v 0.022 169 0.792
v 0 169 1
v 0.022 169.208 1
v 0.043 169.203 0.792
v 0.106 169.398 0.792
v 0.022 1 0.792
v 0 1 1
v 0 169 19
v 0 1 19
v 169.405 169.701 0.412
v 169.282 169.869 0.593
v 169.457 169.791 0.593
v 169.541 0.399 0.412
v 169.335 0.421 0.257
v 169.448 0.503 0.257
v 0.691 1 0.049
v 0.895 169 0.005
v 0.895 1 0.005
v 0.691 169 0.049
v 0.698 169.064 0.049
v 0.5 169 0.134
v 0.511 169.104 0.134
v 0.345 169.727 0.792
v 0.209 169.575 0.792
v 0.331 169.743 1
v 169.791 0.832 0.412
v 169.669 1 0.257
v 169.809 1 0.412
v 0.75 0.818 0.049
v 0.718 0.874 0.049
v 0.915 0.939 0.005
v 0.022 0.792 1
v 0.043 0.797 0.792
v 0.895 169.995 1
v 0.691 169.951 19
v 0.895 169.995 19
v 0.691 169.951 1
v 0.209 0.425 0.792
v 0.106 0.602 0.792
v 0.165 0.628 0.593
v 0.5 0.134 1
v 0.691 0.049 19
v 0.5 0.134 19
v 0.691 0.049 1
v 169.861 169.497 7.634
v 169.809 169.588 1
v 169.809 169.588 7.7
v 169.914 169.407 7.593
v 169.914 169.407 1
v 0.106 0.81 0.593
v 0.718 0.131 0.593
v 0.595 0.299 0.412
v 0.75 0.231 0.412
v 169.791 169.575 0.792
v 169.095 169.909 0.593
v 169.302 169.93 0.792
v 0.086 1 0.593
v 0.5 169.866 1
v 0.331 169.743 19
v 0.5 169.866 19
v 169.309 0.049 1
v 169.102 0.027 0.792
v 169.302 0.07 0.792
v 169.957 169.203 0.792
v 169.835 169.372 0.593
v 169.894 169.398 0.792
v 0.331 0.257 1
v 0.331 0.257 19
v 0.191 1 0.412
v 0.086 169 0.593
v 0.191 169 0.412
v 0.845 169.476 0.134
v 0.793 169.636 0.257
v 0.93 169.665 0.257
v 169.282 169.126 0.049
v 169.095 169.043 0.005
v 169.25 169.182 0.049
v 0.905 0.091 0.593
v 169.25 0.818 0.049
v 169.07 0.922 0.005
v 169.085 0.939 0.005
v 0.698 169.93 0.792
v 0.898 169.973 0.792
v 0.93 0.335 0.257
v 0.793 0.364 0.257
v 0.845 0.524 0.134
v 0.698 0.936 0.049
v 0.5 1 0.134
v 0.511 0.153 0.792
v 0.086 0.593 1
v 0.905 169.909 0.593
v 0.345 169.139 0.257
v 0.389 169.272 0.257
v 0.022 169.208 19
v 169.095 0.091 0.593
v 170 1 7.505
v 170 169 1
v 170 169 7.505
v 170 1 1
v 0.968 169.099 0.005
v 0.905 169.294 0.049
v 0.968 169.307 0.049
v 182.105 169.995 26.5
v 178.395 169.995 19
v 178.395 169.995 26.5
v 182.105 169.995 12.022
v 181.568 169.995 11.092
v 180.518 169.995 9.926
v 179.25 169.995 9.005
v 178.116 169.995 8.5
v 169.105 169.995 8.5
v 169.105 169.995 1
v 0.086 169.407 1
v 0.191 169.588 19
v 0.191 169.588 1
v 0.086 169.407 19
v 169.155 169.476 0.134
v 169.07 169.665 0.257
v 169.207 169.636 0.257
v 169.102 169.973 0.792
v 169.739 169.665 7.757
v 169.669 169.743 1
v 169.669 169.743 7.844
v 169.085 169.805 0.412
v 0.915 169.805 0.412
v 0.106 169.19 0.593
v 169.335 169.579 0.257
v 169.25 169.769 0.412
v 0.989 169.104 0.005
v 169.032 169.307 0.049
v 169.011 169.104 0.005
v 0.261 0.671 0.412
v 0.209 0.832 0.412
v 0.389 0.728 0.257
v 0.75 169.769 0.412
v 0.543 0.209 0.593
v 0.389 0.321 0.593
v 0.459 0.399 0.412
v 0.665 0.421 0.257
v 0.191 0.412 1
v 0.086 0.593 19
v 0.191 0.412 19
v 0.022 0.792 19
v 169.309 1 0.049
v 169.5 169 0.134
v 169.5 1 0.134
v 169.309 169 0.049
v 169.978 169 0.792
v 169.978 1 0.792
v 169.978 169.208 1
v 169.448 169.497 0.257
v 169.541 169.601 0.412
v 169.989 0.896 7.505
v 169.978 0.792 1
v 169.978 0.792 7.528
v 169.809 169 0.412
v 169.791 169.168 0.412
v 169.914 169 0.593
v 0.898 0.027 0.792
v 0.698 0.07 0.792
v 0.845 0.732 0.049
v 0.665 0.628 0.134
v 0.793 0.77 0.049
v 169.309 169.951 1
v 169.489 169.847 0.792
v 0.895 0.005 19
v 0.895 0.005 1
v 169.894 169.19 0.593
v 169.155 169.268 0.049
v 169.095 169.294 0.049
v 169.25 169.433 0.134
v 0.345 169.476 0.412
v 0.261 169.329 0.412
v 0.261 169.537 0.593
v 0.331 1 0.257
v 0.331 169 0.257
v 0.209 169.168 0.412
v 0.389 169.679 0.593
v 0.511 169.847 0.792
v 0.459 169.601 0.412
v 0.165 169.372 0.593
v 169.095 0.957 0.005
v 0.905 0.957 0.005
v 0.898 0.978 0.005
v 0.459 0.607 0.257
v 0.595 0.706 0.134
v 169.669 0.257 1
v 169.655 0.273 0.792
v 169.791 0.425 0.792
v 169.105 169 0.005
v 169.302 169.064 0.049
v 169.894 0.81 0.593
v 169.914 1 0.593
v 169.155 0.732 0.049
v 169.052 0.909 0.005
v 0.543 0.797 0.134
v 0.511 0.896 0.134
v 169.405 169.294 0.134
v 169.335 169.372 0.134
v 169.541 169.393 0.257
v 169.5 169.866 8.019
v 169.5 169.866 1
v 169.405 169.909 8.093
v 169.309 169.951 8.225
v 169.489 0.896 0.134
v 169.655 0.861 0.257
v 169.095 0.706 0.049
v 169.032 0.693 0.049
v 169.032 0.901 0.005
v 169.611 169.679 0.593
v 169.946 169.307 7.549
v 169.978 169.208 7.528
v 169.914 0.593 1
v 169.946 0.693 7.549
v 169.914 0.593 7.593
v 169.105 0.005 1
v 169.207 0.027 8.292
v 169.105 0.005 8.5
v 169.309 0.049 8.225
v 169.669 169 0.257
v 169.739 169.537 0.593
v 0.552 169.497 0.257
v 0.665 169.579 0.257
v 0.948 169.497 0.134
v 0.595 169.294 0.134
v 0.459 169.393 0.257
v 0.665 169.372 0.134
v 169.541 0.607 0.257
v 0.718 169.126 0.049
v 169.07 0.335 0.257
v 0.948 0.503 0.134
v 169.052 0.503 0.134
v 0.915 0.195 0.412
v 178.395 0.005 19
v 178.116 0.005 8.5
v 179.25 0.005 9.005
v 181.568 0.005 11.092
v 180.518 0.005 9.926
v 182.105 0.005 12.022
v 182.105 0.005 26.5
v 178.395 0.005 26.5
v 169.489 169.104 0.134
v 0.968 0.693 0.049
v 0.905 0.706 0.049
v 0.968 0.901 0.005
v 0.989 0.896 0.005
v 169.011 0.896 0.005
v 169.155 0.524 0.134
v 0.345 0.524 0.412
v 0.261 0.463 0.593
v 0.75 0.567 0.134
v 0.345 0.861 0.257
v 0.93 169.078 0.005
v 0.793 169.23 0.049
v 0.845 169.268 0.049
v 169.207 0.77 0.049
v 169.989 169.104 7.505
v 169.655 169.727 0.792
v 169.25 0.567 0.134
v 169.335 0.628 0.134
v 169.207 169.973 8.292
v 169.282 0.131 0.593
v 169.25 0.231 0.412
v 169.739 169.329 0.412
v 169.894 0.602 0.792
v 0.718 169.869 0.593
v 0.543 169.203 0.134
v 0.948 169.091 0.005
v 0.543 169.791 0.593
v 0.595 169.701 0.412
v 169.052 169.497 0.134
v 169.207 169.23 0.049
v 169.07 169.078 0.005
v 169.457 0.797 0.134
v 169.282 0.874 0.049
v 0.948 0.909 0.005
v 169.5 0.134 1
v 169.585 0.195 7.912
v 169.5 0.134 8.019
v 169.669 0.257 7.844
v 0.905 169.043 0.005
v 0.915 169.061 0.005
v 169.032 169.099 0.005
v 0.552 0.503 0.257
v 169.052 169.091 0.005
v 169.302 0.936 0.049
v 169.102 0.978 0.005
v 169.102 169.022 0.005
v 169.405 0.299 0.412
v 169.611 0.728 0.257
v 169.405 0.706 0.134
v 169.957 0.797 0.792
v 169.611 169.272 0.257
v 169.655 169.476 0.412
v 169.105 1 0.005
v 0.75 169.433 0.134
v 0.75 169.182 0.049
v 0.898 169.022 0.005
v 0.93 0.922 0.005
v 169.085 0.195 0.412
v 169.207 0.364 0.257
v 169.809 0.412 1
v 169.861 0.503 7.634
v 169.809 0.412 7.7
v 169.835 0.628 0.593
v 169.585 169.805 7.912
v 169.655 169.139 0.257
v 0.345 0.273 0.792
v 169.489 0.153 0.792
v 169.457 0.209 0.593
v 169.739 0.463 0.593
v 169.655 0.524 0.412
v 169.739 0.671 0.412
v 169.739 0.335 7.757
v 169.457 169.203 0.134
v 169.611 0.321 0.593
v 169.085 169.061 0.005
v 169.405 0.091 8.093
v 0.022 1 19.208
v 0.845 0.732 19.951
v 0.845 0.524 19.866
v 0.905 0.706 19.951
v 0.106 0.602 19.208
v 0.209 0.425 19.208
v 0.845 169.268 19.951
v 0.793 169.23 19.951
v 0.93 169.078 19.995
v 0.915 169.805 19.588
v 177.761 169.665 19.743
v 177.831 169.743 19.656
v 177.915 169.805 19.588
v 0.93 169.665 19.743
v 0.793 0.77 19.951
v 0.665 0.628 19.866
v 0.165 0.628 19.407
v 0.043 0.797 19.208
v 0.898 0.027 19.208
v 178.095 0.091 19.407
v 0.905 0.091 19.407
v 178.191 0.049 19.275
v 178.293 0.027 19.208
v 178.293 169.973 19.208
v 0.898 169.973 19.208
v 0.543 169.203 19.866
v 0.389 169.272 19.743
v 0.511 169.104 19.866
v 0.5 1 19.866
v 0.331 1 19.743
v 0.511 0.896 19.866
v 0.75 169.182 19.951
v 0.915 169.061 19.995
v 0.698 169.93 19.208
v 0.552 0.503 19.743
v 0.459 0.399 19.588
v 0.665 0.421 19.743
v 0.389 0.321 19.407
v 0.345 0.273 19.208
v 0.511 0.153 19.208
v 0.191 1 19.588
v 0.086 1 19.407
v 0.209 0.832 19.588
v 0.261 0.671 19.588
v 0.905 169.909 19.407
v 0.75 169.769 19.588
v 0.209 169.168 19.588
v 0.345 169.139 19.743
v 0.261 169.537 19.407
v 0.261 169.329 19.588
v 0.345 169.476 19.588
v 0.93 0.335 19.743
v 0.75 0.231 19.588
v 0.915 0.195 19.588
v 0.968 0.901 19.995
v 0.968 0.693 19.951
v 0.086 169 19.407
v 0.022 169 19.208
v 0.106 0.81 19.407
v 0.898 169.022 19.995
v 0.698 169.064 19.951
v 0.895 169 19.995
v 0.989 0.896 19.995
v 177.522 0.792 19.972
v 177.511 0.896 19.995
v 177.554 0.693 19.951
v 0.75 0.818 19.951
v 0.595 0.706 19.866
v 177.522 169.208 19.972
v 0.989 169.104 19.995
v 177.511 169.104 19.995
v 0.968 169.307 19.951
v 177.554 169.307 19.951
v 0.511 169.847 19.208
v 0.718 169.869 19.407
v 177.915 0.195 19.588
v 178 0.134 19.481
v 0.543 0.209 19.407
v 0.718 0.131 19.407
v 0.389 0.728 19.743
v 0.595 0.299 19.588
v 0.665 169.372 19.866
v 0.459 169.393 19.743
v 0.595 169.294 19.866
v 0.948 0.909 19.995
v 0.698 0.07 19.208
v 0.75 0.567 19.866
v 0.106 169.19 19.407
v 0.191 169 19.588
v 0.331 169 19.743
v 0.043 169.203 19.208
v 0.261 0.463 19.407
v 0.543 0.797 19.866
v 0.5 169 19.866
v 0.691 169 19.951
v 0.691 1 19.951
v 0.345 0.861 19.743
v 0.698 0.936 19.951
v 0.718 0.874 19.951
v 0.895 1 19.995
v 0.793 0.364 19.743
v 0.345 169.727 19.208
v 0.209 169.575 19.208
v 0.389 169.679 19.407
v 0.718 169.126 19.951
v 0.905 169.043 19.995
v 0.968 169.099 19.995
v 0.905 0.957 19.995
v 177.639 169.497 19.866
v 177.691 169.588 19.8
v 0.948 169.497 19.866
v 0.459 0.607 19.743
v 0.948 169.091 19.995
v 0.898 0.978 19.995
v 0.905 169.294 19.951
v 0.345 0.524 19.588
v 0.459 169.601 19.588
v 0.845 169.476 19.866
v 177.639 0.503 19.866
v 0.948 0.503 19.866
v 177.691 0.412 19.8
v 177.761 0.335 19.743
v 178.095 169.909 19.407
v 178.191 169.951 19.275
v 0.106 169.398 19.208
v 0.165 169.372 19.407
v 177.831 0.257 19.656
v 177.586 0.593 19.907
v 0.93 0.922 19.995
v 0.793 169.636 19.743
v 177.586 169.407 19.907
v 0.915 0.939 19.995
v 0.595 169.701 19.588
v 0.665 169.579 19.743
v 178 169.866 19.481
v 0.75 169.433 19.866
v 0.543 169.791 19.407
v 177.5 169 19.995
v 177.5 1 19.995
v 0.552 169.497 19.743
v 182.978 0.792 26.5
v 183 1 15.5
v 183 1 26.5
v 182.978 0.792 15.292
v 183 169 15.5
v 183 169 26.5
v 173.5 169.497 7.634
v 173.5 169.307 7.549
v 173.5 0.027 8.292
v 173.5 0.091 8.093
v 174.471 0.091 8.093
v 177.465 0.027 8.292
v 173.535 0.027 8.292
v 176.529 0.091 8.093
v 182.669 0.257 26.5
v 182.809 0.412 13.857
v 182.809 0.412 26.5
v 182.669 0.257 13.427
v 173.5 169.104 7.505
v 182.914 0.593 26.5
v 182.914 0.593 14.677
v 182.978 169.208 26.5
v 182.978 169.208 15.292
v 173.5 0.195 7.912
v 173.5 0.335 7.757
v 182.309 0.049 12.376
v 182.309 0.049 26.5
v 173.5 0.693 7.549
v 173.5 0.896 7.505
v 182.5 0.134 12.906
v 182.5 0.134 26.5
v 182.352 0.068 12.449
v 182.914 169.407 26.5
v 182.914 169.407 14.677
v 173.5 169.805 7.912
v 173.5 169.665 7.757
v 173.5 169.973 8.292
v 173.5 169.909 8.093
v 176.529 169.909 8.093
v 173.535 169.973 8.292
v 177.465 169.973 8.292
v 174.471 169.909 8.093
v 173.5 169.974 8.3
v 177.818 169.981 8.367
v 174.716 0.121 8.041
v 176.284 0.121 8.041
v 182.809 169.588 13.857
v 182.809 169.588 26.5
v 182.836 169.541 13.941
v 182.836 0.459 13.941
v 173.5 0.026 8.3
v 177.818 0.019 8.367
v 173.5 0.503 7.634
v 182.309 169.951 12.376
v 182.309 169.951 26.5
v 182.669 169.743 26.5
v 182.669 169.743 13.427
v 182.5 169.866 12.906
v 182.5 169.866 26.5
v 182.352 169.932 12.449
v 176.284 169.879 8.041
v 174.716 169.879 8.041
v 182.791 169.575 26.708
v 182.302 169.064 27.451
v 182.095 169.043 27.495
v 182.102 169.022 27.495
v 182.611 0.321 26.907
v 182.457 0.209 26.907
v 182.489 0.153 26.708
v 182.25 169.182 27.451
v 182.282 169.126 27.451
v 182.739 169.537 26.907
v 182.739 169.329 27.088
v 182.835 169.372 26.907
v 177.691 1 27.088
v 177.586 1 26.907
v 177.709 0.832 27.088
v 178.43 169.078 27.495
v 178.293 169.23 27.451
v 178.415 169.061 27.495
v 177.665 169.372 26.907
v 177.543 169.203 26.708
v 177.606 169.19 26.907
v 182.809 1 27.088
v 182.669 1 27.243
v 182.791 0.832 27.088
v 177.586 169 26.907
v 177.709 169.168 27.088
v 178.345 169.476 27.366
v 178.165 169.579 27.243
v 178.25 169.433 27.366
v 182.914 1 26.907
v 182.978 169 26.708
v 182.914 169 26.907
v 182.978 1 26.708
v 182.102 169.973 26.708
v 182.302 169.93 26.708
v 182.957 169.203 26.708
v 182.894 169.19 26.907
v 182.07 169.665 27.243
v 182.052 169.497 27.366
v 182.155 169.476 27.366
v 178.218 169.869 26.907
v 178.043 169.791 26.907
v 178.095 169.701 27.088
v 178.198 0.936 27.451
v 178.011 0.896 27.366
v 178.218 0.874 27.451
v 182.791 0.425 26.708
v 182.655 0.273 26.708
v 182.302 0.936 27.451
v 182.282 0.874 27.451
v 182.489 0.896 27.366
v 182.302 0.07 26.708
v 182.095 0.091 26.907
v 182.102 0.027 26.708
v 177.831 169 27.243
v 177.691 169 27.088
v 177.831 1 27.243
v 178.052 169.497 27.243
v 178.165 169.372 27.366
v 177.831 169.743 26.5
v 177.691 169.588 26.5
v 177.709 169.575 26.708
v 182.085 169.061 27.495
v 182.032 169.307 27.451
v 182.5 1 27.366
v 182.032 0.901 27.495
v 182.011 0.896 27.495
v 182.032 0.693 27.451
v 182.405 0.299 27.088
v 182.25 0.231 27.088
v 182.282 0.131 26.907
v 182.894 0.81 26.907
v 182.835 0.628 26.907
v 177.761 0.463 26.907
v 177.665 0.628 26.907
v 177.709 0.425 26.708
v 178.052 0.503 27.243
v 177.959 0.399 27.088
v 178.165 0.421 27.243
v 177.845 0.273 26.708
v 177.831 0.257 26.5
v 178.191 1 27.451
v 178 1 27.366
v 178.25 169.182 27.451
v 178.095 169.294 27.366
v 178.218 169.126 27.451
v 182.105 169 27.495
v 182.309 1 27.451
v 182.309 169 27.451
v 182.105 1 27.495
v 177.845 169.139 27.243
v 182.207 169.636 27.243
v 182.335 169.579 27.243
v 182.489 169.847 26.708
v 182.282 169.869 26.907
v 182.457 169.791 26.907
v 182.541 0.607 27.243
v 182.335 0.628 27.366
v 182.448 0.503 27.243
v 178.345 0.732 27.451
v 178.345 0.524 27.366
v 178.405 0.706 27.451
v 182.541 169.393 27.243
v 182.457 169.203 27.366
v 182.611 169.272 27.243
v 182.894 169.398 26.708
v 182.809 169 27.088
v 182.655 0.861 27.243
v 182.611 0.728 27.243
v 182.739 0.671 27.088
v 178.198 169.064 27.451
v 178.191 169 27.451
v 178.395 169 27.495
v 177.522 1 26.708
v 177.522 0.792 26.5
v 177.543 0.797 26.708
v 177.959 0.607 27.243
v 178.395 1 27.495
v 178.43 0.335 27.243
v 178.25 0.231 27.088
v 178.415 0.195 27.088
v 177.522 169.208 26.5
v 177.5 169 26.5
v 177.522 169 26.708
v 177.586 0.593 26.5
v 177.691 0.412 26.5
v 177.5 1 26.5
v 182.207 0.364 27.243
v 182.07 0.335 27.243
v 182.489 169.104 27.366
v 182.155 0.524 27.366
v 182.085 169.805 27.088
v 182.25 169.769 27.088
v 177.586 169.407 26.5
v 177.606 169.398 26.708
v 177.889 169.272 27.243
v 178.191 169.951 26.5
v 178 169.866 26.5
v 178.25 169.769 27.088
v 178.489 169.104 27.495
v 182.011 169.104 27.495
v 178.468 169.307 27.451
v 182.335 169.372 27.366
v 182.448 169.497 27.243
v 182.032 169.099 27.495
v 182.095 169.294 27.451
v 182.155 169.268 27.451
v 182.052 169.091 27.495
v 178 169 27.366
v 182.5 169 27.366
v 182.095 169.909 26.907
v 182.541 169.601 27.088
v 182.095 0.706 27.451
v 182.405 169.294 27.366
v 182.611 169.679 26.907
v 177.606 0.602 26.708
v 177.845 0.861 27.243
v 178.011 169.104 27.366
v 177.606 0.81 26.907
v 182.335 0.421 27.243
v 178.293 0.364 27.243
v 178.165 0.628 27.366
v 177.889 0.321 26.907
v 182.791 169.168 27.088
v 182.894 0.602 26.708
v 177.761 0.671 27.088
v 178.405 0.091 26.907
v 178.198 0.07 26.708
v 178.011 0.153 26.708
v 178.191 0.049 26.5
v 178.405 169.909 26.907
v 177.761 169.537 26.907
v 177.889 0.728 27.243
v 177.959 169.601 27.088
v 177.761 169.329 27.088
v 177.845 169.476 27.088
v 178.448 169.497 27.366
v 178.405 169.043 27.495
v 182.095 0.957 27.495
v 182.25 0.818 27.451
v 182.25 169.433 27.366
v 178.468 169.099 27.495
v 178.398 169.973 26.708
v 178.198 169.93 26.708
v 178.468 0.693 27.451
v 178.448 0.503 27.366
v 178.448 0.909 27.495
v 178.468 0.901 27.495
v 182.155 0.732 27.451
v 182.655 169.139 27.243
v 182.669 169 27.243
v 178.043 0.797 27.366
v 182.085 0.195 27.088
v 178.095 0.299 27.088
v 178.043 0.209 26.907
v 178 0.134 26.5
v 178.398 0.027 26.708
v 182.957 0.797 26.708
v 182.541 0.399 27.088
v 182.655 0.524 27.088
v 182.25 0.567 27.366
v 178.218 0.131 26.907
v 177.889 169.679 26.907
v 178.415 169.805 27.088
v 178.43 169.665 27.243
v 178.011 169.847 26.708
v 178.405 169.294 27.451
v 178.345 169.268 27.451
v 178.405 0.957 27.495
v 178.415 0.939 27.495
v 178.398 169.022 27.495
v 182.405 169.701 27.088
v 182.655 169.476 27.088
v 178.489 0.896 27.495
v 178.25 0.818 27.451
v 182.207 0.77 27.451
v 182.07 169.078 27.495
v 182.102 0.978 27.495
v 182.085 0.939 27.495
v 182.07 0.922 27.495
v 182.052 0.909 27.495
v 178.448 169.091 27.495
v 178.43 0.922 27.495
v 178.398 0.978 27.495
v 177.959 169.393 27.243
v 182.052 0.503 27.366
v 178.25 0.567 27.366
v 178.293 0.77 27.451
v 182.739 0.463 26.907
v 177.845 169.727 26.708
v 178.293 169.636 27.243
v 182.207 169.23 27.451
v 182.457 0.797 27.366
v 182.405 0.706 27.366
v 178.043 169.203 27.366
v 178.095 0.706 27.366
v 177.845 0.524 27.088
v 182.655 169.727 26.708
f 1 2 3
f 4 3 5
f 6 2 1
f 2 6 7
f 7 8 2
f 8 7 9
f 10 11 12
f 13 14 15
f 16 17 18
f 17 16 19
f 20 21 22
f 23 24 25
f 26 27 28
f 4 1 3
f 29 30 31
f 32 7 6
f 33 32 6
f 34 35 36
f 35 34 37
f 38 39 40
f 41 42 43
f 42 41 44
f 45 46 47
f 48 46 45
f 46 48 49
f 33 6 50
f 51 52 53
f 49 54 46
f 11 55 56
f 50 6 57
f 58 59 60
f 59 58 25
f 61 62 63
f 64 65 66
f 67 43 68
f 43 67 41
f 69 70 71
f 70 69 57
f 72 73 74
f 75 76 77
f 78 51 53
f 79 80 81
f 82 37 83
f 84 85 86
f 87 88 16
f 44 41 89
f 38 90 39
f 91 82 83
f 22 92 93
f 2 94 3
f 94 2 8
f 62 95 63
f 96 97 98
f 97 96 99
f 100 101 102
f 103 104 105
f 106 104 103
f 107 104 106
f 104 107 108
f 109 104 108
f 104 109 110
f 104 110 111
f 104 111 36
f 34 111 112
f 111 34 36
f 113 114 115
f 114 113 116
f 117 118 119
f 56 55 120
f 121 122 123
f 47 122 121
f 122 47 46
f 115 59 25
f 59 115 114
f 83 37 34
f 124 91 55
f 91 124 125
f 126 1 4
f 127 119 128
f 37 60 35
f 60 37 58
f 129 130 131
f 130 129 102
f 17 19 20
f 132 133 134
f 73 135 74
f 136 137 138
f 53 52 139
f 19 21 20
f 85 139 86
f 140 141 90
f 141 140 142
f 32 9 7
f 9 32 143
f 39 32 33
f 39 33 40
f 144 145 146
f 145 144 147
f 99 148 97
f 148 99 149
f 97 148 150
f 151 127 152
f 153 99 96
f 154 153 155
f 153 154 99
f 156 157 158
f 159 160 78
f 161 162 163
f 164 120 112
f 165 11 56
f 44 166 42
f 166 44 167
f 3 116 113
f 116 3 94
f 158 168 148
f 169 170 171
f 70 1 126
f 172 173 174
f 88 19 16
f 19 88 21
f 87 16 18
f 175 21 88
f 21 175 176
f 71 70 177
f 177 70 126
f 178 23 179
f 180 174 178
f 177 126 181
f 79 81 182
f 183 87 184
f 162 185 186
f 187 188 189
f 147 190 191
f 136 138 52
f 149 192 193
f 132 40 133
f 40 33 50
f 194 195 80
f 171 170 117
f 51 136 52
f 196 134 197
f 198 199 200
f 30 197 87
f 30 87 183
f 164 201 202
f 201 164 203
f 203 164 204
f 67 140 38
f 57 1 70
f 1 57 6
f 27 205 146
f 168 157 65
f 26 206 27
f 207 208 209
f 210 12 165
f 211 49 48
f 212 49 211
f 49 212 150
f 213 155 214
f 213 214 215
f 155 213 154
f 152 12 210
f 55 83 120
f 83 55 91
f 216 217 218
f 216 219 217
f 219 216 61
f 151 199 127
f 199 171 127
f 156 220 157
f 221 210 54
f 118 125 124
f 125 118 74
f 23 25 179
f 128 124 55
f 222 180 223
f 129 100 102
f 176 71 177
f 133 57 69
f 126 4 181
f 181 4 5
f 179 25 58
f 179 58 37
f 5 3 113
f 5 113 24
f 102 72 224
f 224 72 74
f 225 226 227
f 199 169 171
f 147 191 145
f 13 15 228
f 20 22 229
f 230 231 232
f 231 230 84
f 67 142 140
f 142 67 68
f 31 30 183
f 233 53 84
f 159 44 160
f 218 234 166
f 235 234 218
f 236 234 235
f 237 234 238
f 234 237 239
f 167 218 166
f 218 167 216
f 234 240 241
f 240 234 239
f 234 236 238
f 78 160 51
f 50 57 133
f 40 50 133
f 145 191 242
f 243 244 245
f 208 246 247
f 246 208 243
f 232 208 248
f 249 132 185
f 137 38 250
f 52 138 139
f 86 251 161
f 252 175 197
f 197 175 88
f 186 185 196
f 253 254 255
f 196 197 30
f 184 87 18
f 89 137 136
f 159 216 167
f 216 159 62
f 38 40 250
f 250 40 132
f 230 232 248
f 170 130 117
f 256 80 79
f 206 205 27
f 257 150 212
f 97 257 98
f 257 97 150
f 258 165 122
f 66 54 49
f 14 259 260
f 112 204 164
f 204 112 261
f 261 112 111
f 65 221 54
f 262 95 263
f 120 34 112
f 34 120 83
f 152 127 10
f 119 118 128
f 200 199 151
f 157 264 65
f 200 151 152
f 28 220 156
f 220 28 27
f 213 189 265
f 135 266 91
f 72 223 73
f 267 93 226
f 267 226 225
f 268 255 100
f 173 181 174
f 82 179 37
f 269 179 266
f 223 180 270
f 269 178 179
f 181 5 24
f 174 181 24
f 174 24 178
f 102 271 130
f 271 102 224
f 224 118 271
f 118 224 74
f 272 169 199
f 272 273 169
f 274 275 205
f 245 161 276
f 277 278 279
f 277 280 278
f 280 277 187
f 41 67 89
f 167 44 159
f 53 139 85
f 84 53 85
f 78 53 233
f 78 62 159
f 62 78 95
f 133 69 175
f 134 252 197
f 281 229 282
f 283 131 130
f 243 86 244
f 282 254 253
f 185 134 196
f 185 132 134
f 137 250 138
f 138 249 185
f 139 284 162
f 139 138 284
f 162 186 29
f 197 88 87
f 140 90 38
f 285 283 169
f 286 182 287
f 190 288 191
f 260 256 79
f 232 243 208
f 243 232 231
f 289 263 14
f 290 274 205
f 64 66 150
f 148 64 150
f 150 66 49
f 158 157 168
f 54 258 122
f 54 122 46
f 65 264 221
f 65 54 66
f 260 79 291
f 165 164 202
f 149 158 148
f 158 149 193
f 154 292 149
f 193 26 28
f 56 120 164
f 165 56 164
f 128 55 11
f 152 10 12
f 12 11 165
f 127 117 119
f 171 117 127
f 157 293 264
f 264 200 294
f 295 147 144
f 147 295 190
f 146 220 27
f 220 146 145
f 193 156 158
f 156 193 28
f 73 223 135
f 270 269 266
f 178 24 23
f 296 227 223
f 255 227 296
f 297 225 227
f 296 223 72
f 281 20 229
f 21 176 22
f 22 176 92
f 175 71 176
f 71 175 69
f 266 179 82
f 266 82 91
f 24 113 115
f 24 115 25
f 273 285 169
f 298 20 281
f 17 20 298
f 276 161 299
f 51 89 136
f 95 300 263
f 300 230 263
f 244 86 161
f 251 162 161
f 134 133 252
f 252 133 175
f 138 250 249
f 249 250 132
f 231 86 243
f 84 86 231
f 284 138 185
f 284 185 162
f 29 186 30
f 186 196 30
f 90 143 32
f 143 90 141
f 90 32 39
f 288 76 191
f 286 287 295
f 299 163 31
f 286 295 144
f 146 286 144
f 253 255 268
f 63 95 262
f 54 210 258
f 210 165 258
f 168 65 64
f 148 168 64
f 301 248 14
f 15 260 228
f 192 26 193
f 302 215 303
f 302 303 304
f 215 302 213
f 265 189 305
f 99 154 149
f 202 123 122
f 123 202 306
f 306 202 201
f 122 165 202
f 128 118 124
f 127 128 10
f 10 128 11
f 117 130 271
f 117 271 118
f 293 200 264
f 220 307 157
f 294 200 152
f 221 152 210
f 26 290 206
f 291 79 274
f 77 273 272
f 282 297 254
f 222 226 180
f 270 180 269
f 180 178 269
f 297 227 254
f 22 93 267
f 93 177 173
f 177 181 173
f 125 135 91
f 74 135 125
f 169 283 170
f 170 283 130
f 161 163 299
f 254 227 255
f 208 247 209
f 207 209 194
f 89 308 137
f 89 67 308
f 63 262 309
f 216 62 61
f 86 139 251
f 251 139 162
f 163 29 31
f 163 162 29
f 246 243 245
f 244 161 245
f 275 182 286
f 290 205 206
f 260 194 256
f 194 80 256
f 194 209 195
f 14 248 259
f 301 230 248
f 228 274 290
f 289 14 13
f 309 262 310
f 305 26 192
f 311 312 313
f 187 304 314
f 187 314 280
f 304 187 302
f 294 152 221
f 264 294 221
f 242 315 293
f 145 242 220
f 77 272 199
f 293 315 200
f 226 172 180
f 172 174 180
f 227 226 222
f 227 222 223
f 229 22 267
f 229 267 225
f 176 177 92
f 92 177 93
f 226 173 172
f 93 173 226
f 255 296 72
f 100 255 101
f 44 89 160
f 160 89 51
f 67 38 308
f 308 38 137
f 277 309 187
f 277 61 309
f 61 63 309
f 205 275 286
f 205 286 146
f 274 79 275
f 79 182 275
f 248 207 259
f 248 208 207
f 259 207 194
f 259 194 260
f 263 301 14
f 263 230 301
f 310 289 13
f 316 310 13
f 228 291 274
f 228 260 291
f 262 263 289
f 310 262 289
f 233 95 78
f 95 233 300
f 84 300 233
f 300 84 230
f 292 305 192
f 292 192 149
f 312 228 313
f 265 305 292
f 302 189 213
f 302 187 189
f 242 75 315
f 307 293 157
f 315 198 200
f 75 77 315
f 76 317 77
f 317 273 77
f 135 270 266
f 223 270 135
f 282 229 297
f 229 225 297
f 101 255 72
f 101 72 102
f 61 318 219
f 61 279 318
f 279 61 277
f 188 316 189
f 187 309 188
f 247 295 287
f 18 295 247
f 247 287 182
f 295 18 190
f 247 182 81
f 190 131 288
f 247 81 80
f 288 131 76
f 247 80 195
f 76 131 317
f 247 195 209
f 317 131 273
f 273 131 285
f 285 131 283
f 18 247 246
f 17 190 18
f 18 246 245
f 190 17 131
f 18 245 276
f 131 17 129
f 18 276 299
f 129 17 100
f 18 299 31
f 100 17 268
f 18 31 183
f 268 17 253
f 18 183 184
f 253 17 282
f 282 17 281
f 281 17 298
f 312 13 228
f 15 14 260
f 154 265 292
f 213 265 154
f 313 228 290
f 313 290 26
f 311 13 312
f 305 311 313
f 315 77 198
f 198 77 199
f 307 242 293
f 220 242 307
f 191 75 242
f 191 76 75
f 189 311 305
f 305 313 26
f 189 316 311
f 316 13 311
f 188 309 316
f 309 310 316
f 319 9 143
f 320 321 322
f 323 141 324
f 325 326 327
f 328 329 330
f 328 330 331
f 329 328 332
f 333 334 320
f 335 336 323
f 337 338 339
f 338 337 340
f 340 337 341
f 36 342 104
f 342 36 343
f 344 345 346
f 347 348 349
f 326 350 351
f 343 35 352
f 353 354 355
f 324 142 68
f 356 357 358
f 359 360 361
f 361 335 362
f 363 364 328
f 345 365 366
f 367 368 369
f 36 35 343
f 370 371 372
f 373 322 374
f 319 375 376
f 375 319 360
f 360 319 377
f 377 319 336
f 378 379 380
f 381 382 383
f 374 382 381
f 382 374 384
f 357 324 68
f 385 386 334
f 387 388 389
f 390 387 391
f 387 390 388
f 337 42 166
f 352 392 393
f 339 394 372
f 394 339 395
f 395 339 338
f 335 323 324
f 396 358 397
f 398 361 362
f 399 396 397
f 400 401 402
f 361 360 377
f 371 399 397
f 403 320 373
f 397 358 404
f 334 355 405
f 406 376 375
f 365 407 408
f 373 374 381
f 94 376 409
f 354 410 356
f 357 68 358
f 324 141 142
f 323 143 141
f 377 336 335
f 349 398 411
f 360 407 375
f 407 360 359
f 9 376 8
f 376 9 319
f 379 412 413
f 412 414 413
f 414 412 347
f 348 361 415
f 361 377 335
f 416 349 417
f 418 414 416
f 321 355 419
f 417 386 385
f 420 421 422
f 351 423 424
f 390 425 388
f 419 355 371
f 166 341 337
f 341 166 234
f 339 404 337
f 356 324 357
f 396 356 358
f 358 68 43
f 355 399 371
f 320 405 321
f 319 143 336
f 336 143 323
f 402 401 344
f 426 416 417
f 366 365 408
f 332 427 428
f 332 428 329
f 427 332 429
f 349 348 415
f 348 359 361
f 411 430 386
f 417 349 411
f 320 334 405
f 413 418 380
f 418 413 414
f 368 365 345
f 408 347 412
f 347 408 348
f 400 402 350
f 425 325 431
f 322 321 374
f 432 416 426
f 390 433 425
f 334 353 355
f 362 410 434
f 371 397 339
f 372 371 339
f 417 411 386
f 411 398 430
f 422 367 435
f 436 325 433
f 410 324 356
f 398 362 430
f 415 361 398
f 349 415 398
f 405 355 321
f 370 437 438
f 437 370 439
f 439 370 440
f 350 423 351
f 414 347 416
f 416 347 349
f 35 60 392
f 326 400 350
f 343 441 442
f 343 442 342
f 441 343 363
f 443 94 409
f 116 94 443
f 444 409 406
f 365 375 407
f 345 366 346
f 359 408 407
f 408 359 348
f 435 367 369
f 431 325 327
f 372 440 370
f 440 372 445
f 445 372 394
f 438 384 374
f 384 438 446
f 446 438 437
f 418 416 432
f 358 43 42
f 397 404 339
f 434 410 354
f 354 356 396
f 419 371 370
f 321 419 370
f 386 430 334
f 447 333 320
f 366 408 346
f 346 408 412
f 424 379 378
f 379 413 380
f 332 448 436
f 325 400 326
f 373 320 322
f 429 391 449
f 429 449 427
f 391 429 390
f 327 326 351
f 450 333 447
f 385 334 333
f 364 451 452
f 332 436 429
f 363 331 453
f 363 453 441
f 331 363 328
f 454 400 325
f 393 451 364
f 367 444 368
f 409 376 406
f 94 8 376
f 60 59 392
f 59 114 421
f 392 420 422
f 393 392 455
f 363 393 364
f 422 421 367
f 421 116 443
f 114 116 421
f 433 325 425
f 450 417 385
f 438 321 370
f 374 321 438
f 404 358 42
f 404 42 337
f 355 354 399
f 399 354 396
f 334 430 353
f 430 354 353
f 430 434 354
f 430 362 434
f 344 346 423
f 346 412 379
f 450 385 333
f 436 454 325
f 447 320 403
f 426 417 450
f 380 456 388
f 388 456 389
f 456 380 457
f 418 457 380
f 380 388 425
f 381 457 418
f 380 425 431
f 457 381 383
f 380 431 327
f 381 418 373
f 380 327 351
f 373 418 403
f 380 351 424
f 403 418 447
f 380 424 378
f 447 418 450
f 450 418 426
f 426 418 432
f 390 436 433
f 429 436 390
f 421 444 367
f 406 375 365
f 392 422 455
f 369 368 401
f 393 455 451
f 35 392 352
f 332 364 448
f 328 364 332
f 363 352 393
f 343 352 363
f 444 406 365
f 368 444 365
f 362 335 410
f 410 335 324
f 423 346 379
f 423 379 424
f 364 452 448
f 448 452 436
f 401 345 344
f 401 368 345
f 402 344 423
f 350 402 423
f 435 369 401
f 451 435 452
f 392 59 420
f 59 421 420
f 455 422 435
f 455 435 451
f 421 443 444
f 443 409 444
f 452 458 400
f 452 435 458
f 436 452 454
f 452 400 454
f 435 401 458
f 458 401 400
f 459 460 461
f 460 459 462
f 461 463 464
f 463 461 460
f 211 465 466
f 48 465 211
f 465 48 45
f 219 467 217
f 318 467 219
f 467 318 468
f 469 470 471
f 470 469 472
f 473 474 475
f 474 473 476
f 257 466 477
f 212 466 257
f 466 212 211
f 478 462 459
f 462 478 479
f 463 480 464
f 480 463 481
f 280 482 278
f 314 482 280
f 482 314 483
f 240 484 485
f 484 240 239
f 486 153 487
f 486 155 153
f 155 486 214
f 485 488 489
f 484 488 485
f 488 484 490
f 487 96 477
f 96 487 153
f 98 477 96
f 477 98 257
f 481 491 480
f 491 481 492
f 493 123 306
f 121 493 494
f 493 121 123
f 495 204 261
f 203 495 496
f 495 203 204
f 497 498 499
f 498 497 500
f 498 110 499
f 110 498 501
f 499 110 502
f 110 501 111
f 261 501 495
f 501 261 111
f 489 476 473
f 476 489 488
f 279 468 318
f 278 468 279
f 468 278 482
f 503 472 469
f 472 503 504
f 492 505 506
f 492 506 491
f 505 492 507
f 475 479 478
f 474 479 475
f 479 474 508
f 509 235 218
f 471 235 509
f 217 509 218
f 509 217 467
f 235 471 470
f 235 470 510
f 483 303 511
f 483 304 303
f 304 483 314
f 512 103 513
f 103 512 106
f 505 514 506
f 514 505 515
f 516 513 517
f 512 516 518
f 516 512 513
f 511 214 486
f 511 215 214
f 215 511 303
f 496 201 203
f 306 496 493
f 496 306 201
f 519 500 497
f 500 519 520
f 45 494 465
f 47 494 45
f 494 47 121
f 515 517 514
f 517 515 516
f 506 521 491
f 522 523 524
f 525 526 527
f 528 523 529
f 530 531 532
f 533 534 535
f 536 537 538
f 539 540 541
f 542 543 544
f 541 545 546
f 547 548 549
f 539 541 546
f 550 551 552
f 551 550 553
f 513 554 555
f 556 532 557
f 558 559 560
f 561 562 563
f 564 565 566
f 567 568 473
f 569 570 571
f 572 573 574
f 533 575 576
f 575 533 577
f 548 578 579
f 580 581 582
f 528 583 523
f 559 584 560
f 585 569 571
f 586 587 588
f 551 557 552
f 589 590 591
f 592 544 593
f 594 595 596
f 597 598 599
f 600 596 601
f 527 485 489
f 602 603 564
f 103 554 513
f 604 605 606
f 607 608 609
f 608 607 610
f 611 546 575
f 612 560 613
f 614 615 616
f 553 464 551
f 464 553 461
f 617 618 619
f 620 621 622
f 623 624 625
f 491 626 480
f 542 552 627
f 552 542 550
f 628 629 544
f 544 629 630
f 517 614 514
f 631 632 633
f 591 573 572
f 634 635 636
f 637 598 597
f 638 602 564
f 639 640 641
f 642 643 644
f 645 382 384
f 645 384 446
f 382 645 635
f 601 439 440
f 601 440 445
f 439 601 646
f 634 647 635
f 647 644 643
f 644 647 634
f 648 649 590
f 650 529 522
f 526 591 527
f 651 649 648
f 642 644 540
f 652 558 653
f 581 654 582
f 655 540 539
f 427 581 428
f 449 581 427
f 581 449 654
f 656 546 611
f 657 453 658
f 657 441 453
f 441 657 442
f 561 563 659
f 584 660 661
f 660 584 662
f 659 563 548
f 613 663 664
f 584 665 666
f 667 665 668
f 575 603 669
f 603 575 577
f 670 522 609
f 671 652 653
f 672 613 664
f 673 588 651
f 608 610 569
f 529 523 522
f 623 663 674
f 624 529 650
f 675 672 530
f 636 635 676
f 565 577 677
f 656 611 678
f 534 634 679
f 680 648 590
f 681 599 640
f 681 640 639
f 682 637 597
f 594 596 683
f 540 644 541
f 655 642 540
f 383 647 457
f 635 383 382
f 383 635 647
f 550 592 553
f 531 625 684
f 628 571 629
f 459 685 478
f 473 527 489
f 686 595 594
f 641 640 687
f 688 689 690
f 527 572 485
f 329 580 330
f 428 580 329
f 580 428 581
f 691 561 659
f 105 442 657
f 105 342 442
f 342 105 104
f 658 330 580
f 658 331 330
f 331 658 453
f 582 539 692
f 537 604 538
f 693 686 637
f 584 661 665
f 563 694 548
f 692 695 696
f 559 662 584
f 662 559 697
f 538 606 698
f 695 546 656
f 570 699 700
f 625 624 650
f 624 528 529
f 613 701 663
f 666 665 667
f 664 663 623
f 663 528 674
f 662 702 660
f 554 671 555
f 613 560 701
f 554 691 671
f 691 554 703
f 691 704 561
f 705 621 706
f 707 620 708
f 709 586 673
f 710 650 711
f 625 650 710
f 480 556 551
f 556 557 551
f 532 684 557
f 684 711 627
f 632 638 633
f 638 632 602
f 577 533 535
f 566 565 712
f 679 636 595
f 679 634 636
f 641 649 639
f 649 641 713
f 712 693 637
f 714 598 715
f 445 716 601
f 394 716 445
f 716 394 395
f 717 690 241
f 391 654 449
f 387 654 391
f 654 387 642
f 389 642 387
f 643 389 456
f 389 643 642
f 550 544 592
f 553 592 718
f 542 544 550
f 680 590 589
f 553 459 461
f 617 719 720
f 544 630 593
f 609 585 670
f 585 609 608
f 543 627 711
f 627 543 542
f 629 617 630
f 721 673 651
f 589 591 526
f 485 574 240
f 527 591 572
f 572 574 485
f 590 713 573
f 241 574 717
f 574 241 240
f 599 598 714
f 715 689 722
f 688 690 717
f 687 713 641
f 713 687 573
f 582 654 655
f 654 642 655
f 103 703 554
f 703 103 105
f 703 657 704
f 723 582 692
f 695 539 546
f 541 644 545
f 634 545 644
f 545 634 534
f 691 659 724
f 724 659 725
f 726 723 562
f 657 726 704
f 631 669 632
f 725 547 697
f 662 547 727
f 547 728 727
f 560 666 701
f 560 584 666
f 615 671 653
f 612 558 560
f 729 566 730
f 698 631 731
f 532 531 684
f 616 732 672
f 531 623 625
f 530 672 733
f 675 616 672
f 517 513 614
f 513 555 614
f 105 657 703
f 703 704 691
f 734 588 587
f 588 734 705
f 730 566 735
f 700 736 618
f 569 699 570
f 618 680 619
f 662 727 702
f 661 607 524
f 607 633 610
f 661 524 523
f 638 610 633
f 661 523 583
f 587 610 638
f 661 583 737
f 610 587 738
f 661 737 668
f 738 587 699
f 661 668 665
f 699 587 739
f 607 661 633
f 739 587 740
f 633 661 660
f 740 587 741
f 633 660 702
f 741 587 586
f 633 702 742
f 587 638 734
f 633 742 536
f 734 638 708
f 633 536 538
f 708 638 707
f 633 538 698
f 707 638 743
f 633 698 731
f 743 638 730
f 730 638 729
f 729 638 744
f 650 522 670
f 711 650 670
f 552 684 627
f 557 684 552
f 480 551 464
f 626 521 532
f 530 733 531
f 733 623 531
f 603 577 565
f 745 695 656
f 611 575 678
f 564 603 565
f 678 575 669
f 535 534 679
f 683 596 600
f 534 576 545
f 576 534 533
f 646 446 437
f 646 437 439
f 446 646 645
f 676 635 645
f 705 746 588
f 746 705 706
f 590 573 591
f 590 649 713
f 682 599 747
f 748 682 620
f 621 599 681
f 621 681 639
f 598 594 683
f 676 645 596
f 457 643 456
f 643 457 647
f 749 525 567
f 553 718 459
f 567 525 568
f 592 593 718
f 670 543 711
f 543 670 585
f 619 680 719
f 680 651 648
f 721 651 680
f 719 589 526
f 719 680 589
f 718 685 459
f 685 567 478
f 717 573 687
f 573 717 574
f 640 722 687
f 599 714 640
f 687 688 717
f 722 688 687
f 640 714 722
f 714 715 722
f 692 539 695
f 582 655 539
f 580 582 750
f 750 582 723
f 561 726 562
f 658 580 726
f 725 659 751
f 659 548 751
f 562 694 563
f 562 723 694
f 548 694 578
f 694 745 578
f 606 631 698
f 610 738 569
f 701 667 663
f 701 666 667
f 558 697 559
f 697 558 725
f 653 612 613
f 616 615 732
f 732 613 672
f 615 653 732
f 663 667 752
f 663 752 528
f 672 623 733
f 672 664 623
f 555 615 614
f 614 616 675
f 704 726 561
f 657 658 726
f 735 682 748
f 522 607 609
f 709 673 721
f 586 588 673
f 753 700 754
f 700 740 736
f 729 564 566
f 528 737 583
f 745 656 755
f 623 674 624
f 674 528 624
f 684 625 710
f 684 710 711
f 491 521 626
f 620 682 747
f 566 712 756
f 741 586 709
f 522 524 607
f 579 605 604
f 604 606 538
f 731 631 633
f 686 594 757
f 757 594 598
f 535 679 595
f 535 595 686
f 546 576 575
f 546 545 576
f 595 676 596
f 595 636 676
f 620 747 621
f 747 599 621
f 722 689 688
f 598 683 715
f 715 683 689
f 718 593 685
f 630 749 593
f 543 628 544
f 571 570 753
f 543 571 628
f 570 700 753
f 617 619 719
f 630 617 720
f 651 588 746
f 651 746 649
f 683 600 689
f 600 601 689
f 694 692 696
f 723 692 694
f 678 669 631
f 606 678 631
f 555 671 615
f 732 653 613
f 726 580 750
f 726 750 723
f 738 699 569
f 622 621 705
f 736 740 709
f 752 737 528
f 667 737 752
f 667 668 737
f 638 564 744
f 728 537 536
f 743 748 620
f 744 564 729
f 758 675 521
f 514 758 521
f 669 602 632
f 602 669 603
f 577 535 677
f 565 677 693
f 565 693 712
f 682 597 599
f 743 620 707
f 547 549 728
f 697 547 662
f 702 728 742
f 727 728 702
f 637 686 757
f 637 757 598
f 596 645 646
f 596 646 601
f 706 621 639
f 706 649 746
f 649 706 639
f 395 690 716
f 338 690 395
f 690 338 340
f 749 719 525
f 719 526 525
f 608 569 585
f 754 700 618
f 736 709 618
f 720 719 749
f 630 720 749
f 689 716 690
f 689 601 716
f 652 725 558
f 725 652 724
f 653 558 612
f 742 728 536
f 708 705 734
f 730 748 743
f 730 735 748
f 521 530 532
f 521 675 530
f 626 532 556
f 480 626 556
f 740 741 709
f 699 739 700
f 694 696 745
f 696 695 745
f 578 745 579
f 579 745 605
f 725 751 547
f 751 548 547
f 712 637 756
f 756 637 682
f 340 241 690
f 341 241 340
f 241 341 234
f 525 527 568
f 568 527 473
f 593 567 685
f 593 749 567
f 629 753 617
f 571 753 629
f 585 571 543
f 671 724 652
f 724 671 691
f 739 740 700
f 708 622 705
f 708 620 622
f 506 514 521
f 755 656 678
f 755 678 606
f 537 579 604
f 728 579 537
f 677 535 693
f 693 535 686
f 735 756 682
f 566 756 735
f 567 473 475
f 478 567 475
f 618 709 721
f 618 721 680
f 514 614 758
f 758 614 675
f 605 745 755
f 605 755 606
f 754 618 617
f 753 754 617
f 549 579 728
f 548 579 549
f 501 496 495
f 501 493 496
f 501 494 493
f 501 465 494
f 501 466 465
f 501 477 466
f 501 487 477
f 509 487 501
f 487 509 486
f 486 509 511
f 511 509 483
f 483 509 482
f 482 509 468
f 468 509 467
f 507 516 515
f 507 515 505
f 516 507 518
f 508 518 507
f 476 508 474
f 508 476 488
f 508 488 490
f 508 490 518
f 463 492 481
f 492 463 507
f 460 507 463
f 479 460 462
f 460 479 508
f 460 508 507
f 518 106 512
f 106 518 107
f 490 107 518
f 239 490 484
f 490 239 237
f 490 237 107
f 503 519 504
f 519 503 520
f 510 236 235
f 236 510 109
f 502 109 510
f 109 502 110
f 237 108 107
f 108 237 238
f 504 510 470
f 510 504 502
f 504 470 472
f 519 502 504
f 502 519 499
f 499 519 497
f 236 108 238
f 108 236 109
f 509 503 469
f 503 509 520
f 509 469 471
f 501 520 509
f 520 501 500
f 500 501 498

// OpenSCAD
// file: archie-base.scad
// More information: https://danielupshaw.com/openscad-rounded-corners/

// Set to 0.01 for higher definition curves (renders slower)
$fs = 0.10;

module roundedcube(size = [1, 1, 1], center = false, radius = 0.5, apply_to = "all") {
	// If single value, convert to [x, y, z] vector
	size = (size[0] == undef) ? [size, size, size] : size;

	translate_min = radius;
	translate_xmax = size[0] - radius;
	translate_ymax = size[1] - radius;
	translate_zmax = size[2] - radius;

	diameter = radius * 2;

	obj_translate = (center == false) ?
		[0, 0, 0] : [
			-(size[0] / 2),
			-(size[1] / 2),
			-(size[2] / 2)
		];

	translate(v = obj_translate) {
		hull() {
			for (translate_x = [translate_min, translate_xmax]) {
				x_at = (translate_x == translate_min) ? "min" : "max";
				for (translate_y = [translate_min, translate_ymax]) {
					y_at = (translate_y == translate_min) ? "min" : "max";
					for (translate_z = [translate_min, translate_zmax]) {
						z_at = (translate_z == translate_min) ? "min" : "max";

						translate(v = [translate_x, translate_y, translate_z])
						if (
							(apply_to == "all") ||
							(apply_to == "xmin" && x_at == "min") || (apply_to == "xmax" && x_at == "max") ||
							(apply_to == "ymin" && y_at == "min") || (apply_to == "ymax" && y_at == "max") ||
							(apply_to == "zmin" && z_at == "min") || (apply_to == "zmax" && z_at == "max")
						) {
							sphere(r = radius);
						} else {
							rotate = 
								(apply_to == "xmin" || apply_to == "xmax" || apply_to == "x") ? [0, 90, 0] : (
								(apply_to == "ymin" || apply_to == "ymax" || apply_to == "y") ? [90, 90, 0] :
								[0, 0, 0]
							);
							rotate(a = rotate)
							cylinder(h = diameter, r = radius, center = true);
						}
					}
				}
			}
		}
	}
}

// The following code is a simple archie base box
module base_box(box=130, depth = 130 , height = 30) {
    difference() {
        union() {
            roundedcube([box,depth,height+7.5-20], false, 1,"zmin");
            
            translate([0,0,height-12.5]) {
                roundedcube([box,depth,20-7.5], false, 1, "zmax");
            }
            
            translate([box-2,0,height-20+7.5]){
                roundedcube([15,depth,20-7.5], false, 1, "all");
            }
            
            translate([7.5+box,0,height-4.5]){
                roundedcube([5.5,depth,12], false, 1, "all");
            }
        };

        difference() {
            translate([7.5+box-4,0,height-6.5-7.5]) cube([9.5,depth, 9.5]);
            translate([7.5+box-2,0,height-4.5]) rotate([270,0,0]) cylinder(depth,7.5, 7.5);
        }
    }
}
// main file
include <archie-base.scad>;

depth = 170;
box = 170;
height = 20;

difference() {
    difference() {
        base_box(box, depth, height);
    }
}
